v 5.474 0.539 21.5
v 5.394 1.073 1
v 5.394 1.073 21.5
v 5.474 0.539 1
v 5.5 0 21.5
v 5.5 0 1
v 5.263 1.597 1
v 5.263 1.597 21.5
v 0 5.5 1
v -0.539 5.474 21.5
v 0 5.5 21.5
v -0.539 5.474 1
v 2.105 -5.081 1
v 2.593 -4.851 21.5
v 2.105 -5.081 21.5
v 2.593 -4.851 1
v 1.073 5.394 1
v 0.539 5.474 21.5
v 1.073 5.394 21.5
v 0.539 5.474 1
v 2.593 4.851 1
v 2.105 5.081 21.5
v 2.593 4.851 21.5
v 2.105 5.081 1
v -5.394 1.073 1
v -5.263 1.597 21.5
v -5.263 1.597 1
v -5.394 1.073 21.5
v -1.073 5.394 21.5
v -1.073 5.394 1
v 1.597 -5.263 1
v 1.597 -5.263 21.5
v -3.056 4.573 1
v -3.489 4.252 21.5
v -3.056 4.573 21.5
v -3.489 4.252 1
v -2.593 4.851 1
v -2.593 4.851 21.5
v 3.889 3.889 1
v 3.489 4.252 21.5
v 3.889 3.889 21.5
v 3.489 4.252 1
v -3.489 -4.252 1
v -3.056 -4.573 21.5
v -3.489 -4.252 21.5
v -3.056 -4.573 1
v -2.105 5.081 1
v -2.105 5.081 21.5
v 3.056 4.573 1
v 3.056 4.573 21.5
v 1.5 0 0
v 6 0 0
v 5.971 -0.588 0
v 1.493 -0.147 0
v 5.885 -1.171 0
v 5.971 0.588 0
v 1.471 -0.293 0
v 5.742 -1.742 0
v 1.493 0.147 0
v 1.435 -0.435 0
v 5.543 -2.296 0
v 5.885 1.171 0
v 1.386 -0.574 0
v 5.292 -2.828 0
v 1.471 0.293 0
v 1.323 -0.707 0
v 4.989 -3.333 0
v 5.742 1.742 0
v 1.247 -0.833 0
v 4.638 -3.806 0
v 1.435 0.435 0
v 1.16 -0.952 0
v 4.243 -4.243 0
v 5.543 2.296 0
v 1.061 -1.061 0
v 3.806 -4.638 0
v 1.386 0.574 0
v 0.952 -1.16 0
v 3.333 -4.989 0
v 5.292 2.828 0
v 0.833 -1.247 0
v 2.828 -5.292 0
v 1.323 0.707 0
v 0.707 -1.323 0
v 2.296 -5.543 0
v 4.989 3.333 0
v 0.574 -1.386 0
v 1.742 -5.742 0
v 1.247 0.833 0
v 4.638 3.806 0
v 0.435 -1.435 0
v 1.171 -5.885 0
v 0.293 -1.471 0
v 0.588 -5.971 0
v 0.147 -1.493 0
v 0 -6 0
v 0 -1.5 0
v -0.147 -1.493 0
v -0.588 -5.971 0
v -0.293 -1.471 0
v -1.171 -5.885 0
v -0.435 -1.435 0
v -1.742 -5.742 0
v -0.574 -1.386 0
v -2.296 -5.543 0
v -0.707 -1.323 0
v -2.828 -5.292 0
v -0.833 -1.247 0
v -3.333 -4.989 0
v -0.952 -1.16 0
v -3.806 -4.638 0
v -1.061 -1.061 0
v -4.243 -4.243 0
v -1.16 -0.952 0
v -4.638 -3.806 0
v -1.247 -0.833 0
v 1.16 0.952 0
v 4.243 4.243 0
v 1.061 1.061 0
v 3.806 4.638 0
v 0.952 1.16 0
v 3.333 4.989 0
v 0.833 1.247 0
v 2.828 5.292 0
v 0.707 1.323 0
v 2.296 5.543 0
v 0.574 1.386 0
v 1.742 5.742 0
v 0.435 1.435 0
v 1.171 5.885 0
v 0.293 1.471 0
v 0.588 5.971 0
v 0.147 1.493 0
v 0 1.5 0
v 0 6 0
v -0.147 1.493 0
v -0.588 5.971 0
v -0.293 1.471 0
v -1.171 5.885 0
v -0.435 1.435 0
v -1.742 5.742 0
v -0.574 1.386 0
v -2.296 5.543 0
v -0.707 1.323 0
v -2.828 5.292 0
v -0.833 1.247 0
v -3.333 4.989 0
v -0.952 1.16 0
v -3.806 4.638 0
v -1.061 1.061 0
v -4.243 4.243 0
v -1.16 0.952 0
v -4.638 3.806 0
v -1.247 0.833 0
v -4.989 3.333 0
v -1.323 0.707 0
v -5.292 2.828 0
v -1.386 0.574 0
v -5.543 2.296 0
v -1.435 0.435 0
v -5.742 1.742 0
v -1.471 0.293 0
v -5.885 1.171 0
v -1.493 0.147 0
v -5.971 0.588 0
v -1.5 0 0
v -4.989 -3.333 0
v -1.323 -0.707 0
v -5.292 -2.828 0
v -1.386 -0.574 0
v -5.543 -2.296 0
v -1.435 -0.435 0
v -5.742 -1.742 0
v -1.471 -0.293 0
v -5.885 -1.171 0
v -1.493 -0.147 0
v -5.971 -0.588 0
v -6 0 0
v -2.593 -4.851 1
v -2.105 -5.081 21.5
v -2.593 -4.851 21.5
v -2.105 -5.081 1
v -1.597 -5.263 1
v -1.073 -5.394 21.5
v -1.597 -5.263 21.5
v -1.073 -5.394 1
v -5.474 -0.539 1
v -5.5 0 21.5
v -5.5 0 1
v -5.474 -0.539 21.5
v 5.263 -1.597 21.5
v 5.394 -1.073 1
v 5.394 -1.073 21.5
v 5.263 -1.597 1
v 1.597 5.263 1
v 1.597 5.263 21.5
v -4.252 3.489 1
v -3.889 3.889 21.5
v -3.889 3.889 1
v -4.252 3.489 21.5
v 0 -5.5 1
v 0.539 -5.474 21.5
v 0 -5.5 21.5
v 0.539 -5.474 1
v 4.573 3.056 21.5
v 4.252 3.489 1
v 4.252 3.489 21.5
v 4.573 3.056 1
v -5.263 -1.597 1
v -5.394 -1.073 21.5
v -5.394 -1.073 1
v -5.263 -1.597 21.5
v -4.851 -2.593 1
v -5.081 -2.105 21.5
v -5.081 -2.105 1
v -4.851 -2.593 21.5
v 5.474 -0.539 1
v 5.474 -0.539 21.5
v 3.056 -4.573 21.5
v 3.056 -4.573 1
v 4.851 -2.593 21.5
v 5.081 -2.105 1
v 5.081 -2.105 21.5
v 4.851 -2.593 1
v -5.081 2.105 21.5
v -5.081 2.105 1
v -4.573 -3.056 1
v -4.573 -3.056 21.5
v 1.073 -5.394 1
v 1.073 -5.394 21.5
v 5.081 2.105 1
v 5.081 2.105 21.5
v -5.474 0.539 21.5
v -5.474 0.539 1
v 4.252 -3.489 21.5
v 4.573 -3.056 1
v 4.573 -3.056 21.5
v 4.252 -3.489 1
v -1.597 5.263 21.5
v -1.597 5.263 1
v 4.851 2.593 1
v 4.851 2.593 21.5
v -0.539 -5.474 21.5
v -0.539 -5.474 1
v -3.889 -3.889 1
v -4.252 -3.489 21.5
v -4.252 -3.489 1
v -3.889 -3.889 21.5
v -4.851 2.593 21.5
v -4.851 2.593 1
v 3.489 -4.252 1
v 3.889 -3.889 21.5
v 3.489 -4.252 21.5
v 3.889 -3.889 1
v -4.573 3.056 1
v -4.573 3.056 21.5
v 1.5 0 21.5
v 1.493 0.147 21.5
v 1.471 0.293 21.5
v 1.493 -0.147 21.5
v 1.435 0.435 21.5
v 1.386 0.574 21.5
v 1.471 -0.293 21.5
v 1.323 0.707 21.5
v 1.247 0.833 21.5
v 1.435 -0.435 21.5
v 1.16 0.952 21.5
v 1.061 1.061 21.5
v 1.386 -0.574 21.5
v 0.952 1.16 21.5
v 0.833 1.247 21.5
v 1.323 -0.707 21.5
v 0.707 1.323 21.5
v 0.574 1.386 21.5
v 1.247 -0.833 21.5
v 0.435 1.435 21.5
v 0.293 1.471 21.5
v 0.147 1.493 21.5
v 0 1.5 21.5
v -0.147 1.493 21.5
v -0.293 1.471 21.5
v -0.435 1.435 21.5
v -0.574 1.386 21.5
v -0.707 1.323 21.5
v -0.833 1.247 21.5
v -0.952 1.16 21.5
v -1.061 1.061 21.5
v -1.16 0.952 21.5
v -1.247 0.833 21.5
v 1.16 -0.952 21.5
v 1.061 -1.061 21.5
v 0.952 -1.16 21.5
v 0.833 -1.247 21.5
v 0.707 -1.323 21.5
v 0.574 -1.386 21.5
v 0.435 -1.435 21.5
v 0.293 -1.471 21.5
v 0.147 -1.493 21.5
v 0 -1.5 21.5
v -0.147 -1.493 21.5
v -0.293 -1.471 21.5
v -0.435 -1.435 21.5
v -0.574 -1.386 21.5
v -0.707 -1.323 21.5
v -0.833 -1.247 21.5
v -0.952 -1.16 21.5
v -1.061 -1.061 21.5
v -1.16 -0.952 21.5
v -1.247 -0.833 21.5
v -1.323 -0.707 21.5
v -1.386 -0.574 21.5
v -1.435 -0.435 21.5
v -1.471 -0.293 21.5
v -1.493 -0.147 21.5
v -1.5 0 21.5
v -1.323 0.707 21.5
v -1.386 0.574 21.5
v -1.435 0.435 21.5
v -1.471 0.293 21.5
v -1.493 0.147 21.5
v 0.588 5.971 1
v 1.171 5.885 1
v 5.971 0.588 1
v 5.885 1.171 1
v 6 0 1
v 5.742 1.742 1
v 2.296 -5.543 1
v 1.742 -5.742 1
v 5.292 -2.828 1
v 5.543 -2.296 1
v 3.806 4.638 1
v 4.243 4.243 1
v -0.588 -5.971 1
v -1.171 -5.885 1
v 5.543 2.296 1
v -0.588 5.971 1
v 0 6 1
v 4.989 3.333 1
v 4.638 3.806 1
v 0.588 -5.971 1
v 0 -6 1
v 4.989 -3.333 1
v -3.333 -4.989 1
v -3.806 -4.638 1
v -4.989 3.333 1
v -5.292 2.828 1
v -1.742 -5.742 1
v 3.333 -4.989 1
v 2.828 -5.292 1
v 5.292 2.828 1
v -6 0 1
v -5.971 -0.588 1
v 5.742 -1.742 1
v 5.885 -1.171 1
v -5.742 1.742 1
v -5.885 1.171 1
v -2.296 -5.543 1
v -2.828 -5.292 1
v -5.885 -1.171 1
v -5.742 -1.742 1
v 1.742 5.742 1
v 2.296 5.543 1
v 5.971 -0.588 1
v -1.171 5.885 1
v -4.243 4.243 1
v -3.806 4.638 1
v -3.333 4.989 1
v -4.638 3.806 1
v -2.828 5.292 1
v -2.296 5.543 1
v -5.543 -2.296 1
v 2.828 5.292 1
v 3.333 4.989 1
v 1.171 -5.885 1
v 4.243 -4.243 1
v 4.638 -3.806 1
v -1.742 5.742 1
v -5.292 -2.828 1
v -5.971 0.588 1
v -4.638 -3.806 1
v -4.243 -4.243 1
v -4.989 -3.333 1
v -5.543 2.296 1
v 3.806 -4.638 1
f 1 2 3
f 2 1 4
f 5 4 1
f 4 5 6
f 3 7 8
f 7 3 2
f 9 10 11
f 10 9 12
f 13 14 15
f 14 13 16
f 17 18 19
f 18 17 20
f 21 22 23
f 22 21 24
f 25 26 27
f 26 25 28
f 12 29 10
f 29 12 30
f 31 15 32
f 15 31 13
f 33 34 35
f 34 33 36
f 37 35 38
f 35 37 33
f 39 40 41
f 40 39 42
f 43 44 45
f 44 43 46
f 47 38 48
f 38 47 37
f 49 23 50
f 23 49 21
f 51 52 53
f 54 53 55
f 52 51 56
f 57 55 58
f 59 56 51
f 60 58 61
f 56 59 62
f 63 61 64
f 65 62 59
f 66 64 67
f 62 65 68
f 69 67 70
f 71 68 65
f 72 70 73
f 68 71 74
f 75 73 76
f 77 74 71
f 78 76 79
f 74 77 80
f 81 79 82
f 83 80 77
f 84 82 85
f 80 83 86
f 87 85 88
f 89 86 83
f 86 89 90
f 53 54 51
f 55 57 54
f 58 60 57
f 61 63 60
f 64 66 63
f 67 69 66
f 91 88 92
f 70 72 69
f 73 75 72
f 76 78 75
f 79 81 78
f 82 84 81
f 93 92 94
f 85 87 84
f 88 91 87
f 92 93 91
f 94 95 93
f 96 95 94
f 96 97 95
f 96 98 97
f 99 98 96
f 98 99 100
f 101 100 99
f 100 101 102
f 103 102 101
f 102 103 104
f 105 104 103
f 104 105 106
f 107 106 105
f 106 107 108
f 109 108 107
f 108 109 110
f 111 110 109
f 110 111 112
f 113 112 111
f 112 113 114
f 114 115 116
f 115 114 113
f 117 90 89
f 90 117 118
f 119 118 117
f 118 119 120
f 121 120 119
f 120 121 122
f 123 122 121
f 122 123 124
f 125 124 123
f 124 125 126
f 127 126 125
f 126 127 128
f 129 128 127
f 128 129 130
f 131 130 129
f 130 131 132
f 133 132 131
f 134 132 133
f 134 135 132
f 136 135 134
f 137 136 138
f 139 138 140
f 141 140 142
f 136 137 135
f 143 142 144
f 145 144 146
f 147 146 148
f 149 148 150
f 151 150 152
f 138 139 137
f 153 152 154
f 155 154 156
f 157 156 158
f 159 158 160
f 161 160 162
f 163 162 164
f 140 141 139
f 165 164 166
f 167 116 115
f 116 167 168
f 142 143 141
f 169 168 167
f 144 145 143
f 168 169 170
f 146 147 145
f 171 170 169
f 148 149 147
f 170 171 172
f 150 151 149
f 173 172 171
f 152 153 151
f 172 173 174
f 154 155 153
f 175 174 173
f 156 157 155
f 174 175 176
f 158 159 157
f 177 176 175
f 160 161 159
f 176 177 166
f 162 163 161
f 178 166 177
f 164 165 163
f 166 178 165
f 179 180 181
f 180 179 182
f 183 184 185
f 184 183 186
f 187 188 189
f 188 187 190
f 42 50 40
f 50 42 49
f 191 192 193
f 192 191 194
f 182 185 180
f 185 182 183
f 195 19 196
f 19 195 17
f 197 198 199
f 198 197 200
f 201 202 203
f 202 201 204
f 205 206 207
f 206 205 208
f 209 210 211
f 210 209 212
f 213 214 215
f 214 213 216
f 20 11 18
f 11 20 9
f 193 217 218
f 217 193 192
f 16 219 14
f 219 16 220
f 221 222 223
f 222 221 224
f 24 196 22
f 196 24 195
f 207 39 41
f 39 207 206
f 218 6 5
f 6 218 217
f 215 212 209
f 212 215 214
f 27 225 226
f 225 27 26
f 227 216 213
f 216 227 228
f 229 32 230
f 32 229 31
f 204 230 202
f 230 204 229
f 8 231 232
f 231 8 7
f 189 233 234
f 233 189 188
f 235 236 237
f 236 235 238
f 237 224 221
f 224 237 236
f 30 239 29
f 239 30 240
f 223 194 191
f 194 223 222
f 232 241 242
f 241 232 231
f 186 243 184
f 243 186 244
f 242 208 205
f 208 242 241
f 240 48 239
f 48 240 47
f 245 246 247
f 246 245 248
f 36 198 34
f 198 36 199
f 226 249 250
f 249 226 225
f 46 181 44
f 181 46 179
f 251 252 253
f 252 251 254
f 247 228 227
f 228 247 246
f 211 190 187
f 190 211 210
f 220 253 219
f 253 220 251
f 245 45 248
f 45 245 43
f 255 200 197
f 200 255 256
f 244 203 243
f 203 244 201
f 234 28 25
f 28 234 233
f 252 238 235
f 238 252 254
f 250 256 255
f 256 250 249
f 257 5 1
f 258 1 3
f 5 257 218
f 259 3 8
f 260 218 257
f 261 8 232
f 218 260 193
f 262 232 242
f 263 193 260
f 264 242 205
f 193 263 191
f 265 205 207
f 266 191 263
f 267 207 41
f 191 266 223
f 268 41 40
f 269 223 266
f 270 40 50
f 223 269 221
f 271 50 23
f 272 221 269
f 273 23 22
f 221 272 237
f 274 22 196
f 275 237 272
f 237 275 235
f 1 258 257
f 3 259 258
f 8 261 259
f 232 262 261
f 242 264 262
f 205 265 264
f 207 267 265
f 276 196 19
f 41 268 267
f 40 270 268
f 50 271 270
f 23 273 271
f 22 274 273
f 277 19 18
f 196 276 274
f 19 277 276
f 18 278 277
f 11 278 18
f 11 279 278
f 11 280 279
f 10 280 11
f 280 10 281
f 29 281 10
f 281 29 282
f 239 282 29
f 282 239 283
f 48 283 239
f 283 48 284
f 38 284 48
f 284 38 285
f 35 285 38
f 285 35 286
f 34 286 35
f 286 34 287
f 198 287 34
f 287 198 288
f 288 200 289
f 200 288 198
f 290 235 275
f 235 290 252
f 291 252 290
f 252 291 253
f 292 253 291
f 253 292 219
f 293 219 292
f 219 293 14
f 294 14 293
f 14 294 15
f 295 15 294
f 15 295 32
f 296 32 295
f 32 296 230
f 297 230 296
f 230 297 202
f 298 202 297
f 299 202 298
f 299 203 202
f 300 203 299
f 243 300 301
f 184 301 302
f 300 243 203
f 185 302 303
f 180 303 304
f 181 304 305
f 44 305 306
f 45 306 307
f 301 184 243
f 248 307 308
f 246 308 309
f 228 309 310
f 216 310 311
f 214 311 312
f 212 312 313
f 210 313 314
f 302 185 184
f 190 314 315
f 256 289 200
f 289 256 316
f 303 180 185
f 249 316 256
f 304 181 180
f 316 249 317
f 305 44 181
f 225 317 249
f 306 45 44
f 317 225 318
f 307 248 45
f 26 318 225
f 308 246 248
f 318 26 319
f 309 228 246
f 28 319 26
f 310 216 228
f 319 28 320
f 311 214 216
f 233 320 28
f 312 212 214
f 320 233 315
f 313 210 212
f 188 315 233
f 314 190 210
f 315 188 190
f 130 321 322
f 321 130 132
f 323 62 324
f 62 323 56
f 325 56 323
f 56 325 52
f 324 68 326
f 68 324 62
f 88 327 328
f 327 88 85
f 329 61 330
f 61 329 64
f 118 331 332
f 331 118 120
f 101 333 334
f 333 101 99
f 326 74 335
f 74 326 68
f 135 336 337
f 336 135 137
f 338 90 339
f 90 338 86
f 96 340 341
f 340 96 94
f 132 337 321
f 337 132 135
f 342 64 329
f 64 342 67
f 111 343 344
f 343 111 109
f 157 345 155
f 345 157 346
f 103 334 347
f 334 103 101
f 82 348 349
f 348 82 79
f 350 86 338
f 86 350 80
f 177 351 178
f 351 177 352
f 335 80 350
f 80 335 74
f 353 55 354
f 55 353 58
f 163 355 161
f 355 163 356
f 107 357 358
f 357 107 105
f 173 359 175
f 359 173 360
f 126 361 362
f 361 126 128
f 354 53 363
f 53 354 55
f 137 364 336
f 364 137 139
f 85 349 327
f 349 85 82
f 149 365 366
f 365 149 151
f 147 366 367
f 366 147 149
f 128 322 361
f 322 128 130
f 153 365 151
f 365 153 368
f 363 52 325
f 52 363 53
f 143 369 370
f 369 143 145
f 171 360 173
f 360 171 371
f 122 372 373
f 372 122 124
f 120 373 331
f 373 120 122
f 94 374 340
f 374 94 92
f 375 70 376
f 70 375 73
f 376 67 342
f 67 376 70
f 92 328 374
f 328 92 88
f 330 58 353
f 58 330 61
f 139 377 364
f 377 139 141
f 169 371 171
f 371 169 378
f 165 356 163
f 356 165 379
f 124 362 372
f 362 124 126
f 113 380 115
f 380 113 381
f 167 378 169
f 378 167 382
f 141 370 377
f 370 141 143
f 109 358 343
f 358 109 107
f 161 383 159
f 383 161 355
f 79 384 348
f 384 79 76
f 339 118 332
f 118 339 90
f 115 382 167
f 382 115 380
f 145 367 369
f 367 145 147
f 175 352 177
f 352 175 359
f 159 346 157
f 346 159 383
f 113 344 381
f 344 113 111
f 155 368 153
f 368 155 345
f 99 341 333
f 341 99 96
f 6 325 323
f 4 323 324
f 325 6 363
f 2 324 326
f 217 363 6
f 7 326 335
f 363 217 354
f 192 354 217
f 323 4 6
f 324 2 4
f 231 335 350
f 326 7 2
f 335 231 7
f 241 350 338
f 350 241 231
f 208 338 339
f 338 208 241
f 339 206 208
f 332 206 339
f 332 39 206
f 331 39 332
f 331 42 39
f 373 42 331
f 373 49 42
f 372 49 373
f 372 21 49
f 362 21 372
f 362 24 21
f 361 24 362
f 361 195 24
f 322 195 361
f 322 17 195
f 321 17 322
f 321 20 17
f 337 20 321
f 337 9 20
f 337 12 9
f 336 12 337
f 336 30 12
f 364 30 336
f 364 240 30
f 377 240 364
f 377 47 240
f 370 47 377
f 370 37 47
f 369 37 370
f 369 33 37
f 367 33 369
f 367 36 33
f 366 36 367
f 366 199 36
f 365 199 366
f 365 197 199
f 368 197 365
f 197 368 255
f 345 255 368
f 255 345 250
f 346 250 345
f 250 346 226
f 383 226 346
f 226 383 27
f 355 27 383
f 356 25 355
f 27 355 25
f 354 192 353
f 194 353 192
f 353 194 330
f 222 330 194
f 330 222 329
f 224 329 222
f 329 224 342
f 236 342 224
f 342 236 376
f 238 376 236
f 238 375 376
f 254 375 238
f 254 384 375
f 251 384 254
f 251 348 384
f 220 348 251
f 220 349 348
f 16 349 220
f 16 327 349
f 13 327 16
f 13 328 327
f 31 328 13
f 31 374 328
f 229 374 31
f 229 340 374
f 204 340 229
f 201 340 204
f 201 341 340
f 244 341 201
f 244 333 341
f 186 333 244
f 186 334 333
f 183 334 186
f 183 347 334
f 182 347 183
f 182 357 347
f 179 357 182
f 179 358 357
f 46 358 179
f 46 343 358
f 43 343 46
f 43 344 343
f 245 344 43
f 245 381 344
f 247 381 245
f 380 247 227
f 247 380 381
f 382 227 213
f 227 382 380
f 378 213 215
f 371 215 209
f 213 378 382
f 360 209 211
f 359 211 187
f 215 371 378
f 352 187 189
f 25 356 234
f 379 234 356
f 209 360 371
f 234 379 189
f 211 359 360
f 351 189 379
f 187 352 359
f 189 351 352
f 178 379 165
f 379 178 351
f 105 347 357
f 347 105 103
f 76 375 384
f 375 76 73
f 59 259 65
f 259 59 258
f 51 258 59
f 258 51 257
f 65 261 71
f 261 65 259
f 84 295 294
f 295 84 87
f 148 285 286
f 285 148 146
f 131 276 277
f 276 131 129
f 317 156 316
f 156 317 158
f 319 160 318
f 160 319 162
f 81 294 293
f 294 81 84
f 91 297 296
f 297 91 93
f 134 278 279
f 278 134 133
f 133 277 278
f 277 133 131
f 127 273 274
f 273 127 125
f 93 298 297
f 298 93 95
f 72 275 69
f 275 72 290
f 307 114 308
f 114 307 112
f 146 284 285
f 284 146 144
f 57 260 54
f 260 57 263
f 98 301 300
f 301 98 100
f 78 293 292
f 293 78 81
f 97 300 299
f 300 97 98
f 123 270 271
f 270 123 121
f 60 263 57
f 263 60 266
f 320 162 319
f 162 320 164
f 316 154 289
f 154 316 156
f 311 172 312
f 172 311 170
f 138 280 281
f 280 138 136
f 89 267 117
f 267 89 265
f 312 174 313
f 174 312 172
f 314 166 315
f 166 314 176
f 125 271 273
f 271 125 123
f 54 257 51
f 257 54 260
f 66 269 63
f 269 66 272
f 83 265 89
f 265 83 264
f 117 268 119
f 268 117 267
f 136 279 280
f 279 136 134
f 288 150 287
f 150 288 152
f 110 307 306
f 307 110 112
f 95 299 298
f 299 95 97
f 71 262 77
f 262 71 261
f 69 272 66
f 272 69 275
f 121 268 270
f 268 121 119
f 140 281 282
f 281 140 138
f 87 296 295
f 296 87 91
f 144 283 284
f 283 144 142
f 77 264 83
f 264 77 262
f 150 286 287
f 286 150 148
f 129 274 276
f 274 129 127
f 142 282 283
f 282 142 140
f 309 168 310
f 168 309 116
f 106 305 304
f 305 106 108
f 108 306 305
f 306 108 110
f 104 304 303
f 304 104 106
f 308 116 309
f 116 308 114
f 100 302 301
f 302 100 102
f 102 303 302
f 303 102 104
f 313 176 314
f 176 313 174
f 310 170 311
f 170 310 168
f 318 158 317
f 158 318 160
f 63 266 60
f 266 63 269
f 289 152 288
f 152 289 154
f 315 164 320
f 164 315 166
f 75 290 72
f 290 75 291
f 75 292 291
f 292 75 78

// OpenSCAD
// Hose-barb reducer - a straight (axial) reducer that joins two silicone tubing sizes via
// barbed ends, with a through-bore. The two barb ends are stacked on the same axis. NOVEL part.
//

t1   = 8;
t2   = 5;
L    = 41;
bore = 3;
g    = 1.5;                 // wall thickness for the barbs and the collar

$fn = 64;

outer8 = t1 + 2 * g;
outer5 = t2 + 2 * g;

difference() {
    union() {
        for (z = [0, 10])
            barb(t1, outer8, L / 2, z);      // upper 8 mm barbs
        for (z = [0, 10])
            barb(t2, outer5, L / 2, z + 20); // lower 5 mm barbs
        cylinder(h = L - 40, d = 12);        // end collar
    }
    translate([0, 0, -1]) cylinder(h = L + 2, d = bore);   // through-bore
}

// A right-hand barb: a root diameter d up to height h with a linear taper to tip diameter t,
// then a shoulder back to d. NOVEL shape.
module barb(t, d, h, z) {
    sl = min(h, (d - t) / 2);                 // taper length so the tip stays >= t
    difference() {
        cylinder(h = h + 1, d = d);
        translate([0, 0, z]) cylinder(h = sl + 1, d = t);                 // taper cone
        translate([0, 0, z + h - sl]) cylinder(h = sl + 1, d = d);       // shoulder
    }
}
